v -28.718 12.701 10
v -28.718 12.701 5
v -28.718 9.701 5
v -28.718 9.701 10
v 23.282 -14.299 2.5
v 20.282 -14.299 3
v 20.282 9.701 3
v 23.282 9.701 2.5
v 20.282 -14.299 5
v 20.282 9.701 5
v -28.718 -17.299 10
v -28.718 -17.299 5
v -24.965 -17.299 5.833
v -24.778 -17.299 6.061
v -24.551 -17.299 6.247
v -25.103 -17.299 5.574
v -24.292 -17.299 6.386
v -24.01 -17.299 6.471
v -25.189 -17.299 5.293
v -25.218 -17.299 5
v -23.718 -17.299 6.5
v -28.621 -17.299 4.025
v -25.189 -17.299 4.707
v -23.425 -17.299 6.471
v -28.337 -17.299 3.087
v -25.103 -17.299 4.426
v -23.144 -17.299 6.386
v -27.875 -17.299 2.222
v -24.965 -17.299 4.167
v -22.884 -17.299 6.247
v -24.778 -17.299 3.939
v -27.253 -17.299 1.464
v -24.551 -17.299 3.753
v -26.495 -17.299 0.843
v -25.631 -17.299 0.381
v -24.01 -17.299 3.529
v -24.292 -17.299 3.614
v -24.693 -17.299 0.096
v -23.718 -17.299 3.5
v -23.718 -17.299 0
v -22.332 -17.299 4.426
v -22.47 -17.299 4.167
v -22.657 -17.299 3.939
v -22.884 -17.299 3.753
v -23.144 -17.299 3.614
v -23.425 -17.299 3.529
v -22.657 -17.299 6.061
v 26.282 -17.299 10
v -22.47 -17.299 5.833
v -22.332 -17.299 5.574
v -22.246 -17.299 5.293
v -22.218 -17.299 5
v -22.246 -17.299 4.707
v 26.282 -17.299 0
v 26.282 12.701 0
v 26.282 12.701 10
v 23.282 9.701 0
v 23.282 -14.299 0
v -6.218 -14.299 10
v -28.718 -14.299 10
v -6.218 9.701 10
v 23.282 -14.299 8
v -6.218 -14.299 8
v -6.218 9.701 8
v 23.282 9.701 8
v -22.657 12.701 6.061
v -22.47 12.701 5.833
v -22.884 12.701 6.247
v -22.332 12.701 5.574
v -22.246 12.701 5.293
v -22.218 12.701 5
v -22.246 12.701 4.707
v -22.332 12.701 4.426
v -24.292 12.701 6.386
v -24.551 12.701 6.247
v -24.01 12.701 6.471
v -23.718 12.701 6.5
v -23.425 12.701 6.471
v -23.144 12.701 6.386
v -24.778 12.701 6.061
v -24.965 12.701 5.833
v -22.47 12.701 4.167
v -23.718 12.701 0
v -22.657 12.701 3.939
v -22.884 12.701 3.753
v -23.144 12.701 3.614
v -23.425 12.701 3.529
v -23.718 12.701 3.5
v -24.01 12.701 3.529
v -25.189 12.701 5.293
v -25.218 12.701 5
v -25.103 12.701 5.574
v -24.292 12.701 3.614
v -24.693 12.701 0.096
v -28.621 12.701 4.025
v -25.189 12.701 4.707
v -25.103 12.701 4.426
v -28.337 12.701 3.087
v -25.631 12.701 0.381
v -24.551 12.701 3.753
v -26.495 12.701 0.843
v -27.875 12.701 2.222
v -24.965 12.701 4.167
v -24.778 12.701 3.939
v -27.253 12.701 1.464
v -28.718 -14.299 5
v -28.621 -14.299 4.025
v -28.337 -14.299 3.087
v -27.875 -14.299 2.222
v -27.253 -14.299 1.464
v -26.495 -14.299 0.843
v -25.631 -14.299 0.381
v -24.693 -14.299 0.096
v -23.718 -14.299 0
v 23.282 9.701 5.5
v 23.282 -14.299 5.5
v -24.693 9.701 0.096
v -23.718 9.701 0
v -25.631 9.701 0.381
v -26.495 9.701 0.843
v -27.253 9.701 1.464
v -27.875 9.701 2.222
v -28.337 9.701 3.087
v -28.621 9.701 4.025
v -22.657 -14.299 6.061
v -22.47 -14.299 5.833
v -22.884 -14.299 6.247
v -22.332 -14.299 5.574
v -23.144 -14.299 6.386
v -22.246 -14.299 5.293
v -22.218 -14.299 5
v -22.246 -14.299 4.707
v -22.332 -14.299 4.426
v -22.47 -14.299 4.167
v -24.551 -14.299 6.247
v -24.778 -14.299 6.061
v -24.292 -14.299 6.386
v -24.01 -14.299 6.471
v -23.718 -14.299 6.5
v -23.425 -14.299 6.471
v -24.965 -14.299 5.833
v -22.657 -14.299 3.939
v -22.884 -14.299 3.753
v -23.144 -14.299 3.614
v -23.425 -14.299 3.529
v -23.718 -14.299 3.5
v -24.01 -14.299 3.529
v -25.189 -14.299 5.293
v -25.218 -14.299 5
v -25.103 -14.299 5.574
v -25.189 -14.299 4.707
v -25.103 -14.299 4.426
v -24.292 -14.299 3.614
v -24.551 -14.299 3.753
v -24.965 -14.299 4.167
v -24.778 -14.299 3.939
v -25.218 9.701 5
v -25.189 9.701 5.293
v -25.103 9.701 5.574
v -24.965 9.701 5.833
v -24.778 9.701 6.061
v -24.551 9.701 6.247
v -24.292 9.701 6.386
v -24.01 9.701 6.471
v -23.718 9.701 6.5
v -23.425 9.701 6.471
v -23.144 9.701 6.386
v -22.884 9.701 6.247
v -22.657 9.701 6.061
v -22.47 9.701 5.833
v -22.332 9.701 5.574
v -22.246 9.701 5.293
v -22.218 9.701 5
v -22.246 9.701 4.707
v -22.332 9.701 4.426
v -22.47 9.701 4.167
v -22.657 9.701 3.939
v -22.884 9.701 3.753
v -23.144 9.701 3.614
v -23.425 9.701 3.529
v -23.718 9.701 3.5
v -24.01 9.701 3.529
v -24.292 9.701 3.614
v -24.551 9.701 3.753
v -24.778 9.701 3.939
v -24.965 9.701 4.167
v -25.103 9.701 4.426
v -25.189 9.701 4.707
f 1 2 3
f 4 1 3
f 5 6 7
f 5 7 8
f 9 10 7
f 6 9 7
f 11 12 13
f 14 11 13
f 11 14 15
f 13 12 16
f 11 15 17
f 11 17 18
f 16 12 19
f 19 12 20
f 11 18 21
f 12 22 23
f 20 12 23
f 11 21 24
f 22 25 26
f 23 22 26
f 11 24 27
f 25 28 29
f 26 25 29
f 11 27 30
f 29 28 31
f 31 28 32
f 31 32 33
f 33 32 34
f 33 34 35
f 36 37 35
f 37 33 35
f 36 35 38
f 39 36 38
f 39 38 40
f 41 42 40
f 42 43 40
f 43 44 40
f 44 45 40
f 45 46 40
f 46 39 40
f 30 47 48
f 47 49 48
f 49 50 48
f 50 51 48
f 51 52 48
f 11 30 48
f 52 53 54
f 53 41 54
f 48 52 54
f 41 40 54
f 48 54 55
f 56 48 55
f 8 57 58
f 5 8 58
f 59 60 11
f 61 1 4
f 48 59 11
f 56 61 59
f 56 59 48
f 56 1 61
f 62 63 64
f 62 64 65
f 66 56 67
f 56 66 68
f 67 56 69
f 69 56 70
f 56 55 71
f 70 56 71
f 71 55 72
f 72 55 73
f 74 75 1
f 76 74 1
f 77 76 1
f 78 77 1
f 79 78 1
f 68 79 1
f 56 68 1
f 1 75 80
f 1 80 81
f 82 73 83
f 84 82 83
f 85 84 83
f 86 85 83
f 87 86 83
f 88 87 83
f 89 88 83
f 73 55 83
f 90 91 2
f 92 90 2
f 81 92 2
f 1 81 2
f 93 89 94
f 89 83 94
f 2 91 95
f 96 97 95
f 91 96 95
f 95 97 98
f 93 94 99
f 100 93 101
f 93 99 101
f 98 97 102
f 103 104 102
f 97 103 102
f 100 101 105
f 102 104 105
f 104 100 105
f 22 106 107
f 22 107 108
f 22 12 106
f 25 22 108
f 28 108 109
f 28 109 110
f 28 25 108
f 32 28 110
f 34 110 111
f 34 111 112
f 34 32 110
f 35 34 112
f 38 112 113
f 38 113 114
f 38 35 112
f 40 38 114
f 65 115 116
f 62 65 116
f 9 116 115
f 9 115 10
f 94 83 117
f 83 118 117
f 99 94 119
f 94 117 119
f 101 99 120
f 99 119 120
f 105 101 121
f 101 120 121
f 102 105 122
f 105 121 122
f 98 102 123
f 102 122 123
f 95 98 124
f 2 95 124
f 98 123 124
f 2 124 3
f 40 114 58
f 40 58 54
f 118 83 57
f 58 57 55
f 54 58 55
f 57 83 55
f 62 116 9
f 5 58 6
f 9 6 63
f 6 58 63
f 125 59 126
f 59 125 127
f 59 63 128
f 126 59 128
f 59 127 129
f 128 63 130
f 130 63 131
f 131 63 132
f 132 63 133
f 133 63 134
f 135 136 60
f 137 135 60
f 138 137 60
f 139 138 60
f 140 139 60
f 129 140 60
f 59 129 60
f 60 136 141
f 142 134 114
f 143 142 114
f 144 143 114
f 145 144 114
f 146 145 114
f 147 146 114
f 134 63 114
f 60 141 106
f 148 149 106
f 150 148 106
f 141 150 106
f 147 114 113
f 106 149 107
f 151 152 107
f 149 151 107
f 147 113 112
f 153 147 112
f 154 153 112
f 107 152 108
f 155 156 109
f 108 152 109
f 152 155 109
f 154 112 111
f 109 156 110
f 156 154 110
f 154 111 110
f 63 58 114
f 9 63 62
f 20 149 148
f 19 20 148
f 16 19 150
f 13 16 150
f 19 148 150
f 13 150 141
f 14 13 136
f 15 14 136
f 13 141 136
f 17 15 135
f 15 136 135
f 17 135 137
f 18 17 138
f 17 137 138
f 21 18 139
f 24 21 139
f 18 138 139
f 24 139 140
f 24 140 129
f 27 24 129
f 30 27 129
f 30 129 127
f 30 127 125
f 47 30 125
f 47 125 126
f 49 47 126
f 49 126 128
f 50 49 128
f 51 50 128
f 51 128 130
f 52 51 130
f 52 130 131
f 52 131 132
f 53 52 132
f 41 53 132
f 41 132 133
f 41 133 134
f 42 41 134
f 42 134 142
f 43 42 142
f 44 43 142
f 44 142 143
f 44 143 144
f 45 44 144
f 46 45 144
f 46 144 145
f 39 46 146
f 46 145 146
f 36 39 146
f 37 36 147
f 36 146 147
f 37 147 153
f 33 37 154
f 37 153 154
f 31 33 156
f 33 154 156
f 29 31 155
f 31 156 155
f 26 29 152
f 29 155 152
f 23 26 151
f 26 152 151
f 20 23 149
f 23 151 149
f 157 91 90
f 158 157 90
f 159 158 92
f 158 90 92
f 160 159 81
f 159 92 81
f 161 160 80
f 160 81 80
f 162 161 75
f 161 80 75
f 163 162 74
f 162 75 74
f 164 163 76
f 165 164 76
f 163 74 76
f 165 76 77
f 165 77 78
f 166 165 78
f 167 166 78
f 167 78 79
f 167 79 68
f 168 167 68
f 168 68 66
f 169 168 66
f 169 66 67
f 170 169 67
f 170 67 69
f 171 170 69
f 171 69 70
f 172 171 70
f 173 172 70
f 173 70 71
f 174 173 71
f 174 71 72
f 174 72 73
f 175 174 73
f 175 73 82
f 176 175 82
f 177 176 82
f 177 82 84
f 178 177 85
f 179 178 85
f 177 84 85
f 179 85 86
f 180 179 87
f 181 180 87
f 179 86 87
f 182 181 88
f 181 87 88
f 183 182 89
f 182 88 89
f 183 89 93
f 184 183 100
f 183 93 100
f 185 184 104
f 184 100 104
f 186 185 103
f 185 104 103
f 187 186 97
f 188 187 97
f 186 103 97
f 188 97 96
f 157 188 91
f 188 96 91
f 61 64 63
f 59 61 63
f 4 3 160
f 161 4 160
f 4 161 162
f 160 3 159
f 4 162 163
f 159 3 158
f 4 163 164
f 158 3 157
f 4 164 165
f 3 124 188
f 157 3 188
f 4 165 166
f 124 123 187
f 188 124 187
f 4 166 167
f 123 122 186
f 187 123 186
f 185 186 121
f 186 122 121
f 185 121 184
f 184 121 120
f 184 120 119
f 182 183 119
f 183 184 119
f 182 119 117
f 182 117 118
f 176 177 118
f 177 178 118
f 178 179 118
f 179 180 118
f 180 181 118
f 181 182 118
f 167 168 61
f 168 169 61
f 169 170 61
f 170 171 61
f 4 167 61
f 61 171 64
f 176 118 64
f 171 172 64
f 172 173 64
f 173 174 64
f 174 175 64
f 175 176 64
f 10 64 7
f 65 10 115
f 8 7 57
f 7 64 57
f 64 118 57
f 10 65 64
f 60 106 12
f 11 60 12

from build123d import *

# Parameters (mm, degrees)
F1_DEPTH = 10
F2_W     = 29.5
F2_H     = 24
F3_DEPTH = 8
F5_DEPTH = 24
F6_R     = 1.5
F7_DEPTH = 30
F8_R     = 5


with BuildPart() as f1:
    # F0 (on Top) → F1 (new body)
    with BuildSketch(Plane.XY):
        Polygon((-28.717543, -14.298958), (-28.717543, -17.298958), (26.282457, -17.298958), (26.282457, 12.701042), (-28.717543, 12.701042), (-28.717543, 9.701042), (-6.217543, 9.701042), (-6.217543, -14.298958), align=None)
    extrude(amount=F1_DEPTH)

    # F2 (on face) → F3 (cut)
    with BuildSketch(Plane(origin=(0, 0, 0), x_dir=(1, 0, 0), z_dir=(0, 0, -1))):
        with Locations((8.532457, 2.298958)):
            Rectangle(F2_W, F2_H)
    extrude(amount=-F3_DEPTH, mode=Mode.SUBTRACT)

    # F4 (on face) → F5 (join)
    with BuildSketch(Plane.XZ.offset(-9.701042)):
        Polygon((23.282457, 2.5), (23.282457, 5.5), (20.282457, 5), (20.282457, 3), align=None)
    extrude(amount=F5_DEPTH)

    # F6 (on face) → F7 (cut)
    with BuildSketch(Plane(origin=(0, 12.701042, 0), x_dir=(-1, 0, 0), z_dir=(0, 1, 0))):
        with Locations((23.717543, 5)):
            Circle(F6_R)
    extrude(amount=-F7_DEPTH, mode=Mode.SUBTRACT)

    # F8
    f8_edges = [f1.edges().sort_by_distance(p)[0] for p in [
        (-28.717543, 11.201042, 0),
        (-28.717543, -15.798958, 0),
    ]]
    fillet(f8_edges, radius=F8_R)


solid = f1.part
